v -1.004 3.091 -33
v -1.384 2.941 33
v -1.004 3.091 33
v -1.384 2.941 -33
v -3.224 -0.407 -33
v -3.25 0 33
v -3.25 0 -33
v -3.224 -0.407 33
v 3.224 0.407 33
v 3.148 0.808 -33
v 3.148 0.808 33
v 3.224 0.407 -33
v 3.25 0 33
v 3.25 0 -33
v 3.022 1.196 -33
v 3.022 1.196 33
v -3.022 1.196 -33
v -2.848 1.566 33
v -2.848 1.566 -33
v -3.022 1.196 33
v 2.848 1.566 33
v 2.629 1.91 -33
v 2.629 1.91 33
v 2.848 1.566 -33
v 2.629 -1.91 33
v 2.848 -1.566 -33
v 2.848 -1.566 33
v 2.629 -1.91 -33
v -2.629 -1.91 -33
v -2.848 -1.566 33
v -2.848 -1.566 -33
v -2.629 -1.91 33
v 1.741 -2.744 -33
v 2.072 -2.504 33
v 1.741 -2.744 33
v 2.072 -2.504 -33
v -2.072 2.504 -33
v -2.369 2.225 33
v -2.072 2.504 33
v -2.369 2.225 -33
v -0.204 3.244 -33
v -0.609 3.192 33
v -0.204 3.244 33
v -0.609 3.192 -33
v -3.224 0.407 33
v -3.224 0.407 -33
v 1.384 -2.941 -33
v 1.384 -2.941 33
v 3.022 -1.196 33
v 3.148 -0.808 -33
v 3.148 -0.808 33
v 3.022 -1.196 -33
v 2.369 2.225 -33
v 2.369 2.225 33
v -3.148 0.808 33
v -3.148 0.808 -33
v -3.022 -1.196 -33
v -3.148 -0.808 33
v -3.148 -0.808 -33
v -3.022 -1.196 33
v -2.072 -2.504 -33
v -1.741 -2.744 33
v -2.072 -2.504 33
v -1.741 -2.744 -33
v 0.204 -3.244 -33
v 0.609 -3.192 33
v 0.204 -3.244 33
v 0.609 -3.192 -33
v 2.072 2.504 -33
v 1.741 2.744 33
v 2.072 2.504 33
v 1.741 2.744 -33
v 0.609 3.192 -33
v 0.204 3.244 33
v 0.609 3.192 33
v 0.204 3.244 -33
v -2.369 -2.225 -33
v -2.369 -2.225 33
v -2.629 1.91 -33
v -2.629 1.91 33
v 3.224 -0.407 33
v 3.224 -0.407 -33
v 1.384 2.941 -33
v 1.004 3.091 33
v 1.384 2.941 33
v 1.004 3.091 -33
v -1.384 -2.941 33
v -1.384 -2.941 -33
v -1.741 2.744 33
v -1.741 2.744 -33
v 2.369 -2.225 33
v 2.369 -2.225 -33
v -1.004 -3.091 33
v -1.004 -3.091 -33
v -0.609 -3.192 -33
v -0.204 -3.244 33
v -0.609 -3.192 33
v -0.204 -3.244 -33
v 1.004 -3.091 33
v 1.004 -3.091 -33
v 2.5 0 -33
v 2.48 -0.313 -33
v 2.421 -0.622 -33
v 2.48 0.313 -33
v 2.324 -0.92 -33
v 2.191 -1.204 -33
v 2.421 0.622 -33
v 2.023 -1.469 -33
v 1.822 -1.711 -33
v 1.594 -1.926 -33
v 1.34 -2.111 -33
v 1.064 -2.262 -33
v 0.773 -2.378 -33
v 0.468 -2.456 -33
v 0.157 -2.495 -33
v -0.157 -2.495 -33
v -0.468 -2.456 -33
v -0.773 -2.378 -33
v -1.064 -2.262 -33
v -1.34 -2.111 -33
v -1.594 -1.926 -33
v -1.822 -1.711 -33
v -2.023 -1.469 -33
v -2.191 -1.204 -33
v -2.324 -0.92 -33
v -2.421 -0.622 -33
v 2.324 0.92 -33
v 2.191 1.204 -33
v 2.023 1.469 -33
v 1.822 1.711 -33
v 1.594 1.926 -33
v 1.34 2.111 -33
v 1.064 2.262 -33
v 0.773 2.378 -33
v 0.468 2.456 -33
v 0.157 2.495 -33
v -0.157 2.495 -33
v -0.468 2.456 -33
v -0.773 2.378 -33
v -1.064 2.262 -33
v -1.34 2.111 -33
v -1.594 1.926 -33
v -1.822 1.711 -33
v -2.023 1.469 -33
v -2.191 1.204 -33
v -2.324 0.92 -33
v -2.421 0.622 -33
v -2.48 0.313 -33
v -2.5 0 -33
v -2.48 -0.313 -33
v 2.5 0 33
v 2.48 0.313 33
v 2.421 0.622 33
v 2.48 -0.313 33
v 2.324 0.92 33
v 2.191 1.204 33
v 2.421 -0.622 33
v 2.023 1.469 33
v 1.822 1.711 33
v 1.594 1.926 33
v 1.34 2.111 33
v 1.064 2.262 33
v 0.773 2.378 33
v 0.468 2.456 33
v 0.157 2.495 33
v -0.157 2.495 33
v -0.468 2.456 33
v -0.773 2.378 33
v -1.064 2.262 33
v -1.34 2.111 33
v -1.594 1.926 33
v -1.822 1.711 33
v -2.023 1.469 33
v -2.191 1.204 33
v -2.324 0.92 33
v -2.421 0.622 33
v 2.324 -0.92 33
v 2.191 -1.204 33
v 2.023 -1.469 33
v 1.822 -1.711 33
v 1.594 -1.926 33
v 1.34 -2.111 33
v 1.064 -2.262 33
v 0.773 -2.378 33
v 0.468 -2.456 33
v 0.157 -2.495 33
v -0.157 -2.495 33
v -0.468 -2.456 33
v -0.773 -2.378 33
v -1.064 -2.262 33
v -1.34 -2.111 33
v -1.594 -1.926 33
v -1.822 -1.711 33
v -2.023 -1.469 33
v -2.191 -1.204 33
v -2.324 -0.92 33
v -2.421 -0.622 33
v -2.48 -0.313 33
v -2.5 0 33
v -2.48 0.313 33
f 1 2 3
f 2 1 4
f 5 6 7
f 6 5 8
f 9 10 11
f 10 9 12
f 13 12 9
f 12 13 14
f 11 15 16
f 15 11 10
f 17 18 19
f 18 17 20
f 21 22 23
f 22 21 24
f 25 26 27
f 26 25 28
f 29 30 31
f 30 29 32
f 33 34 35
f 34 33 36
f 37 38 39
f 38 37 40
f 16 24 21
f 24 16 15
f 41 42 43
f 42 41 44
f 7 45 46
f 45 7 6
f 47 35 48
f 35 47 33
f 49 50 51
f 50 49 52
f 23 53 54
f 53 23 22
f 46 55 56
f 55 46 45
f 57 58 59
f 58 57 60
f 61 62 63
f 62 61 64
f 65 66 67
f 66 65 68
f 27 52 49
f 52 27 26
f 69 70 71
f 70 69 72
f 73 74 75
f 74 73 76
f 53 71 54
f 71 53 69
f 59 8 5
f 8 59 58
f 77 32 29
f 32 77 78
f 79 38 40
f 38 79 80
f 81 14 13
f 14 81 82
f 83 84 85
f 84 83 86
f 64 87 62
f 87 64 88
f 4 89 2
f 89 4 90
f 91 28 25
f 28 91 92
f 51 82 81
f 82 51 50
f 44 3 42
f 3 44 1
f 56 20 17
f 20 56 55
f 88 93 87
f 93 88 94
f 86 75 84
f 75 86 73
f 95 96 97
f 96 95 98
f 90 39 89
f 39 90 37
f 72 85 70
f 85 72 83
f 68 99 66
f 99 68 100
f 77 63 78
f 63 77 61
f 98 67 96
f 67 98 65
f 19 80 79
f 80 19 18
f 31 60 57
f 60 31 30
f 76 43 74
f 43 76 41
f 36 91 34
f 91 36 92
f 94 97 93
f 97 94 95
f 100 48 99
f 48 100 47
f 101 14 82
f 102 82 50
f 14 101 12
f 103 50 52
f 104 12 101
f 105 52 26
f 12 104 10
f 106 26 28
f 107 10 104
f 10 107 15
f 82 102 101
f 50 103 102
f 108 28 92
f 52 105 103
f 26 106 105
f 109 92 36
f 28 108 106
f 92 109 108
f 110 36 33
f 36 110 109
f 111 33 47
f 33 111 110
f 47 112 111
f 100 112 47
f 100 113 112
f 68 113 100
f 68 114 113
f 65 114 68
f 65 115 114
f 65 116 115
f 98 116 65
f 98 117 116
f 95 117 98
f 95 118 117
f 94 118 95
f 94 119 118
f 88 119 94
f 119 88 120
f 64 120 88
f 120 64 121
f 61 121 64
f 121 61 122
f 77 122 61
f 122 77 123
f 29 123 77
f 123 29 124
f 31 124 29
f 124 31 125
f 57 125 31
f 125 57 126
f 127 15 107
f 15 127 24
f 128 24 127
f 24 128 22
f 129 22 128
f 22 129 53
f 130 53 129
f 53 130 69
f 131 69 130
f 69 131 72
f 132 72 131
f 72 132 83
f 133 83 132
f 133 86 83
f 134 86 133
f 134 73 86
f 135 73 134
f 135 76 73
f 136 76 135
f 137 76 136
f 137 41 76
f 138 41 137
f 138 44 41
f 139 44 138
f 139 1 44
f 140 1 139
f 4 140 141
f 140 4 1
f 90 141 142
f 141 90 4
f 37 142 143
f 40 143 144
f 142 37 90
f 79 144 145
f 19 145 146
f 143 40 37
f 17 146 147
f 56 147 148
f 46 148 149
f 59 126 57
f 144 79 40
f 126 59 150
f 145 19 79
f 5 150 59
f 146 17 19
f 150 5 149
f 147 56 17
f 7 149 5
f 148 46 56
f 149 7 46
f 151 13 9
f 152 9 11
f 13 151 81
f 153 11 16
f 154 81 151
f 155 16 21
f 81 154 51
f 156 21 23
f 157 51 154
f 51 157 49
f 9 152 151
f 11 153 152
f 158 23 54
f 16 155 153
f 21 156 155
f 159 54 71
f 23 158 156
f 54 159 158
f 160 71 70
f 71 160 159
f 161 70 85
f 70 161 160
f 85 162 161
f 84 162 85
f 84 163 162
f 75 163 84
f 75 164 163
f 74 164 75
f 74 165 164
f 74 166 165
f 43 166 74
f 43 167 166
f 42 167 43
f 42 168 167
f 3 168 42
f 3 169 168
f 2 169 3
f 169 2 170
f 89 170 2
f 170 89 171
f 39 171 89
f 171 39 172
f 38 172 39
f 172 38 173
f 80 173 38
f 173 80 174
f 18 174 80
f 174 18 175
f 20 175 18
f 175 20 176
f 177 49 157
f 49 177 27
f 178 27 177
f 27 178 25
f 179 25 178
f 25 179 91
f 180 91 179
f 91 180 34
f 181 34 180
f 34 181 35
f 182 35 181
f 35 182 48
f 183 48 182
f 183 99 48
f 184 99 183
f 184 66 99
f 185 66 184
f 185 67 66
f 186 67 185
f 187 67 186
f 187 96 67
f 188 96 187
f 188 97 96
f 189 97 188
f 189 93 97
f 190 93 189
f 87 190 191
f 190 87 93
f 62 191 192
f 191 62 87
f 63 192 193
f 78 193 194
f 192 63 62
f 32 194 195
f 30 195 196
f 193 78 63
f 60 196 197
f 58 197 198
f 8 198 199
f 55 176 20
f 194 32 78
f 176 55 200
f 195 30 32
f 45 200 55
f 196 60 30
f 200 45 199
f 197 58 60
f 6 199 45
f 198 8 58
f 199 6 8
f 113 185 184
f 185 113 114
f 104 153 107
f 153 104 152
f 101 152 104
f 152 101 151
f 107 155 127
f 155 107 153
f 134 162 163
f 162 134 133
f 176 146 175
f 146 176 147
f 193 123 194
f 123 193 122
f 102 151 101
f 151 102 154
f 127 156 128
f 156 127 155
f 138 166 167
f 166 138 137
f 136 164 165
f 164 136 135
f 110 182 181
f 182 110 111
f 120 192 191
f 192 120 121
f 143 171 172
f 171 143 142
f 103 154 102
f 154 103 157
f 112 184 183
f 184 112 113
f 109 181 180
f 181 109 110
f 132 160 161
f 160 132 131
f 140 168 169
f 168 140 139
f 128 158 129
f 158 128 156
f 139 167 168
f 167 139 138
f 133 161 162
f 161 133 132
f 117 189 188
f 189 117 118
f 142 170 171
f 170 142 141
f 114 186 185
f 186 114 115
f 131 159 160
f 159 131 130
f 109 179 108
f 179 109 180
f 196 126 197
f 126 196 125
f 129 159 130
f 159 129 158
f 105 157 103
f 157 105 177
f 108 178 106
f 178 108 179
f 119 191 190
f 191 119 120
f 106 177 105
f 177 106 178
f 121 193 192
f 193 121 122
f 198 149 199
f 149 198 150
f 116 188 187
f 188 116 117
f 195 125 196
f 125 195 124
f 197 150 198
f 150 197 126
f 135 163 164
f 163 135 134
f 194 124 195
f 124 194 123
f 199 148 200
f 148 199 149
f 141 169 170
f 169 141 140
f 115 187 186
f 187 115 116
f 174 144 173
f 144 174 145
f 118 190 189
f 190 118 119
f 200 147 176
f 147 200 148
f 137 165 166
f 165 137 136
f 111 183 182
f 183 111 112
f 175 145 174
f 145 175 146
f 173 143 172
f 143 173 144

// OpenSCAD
$fn = 50;


difference() {
	union() {
		translate(v = [0, 0, -33.0000000000]) {
			cylinder(h = 66, r = 3.2500000000);
		}
	}
	union() {
		translate(v = [0, 0, -100.0000000000]) {
			cylinder(h = 200, r = 2.5000000000);
		}
	}
}
